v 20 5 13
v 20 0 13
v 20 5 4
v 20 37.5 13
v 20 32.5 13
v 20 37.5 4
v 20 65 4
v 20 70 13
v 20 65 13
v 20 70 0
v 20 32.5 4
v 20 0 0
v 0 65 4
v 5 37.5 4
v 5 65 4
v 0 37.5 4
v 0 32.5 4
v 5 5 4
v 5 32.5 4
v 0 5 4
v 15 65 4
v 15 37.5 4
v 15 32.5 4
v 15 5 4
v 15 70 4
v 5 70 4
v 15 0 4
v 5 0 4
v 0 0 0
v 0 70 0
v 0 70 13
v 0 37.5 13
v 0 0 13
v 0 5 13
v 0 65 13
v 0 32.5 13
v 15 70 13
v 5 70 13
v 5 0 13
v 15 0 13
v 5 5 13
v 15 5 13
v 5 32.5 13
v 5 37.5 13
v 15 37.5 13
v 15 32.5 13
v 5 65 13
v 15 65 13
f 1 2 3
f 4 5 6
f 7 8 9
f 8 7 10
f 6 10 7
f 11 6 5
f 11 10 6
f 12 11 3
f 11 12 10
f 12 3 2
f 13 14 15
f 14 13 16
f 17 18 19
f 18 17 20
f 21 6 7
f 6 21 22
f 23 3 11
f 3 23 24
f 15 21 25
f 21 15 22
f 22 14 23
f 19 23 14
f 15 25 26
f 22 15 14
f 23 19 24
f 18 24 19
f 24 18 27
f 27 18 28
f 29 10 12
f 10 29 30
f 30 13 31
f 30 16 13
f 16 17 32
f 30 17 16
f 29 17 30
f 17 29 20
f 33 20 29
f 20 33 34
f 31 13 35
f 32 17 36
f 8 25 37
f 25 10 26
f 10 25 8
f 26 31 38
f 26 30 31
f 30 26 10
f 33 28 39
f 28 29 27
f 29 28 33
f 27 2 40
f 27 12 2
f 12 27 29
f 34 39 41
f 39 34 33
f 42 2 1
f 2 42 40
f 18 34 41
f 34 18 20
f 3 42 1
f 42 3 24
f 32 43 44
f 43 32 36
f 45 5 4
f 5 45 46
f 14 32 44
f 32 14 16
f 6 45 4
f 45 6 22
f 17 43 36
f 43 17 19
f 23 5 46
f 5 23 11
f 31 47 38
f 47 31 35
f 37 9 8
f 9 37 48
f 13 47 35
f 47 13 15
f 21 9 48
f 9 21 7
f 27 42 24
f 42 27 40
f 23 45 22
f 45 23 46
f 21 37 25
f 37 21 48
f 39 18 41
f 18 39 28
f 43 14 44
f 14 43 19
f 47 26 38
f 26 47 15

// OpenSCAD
w=20;
d=70;
h=13;
wall=4;
foot=5;

module wedge() {
    mirror([0, 1, 0])
        linear_extrude(scale=[1, h*10], height=h)
        square([w, 0.1]);
}

module v1() {
    side=20;
    difference() {
        union() {
            cube([w, h+side, wall]);
            translate([0, 0, wall]) cube([w, h, foot]);
            translate([0, h-wall, wall]) cube([w, wall, d]);
            translate([0, h, wall+d/2-h]) wedge();
            translate([0, 0, wall+d/2]) cube([w, h, wall]);
            translate([0, h, wall+d/2+h+wall]) mirror([0, 0, 1]) wedge();
            translate([0, h, wall+d-h-foot]) wedge();
            translate([0, 0, wall+d-foot]) cube([w,  h, foot]);
        }
        translate([w/4, 0, 0]) cube([w/2, h-wall, 10000]);
    }
}

difference() {
    union() {
        cube([w, d, wall]);
        cube([w, foot, h]);
        translate([0, d/2-foot/2, 0]) cube([w, foot, h]);
        translate([0, d-foot, 0]) cube([w, foot, h]);
    }
    translate([foot, 0, wall]) cube([w-foot*2, 10000, 1000]);
}
